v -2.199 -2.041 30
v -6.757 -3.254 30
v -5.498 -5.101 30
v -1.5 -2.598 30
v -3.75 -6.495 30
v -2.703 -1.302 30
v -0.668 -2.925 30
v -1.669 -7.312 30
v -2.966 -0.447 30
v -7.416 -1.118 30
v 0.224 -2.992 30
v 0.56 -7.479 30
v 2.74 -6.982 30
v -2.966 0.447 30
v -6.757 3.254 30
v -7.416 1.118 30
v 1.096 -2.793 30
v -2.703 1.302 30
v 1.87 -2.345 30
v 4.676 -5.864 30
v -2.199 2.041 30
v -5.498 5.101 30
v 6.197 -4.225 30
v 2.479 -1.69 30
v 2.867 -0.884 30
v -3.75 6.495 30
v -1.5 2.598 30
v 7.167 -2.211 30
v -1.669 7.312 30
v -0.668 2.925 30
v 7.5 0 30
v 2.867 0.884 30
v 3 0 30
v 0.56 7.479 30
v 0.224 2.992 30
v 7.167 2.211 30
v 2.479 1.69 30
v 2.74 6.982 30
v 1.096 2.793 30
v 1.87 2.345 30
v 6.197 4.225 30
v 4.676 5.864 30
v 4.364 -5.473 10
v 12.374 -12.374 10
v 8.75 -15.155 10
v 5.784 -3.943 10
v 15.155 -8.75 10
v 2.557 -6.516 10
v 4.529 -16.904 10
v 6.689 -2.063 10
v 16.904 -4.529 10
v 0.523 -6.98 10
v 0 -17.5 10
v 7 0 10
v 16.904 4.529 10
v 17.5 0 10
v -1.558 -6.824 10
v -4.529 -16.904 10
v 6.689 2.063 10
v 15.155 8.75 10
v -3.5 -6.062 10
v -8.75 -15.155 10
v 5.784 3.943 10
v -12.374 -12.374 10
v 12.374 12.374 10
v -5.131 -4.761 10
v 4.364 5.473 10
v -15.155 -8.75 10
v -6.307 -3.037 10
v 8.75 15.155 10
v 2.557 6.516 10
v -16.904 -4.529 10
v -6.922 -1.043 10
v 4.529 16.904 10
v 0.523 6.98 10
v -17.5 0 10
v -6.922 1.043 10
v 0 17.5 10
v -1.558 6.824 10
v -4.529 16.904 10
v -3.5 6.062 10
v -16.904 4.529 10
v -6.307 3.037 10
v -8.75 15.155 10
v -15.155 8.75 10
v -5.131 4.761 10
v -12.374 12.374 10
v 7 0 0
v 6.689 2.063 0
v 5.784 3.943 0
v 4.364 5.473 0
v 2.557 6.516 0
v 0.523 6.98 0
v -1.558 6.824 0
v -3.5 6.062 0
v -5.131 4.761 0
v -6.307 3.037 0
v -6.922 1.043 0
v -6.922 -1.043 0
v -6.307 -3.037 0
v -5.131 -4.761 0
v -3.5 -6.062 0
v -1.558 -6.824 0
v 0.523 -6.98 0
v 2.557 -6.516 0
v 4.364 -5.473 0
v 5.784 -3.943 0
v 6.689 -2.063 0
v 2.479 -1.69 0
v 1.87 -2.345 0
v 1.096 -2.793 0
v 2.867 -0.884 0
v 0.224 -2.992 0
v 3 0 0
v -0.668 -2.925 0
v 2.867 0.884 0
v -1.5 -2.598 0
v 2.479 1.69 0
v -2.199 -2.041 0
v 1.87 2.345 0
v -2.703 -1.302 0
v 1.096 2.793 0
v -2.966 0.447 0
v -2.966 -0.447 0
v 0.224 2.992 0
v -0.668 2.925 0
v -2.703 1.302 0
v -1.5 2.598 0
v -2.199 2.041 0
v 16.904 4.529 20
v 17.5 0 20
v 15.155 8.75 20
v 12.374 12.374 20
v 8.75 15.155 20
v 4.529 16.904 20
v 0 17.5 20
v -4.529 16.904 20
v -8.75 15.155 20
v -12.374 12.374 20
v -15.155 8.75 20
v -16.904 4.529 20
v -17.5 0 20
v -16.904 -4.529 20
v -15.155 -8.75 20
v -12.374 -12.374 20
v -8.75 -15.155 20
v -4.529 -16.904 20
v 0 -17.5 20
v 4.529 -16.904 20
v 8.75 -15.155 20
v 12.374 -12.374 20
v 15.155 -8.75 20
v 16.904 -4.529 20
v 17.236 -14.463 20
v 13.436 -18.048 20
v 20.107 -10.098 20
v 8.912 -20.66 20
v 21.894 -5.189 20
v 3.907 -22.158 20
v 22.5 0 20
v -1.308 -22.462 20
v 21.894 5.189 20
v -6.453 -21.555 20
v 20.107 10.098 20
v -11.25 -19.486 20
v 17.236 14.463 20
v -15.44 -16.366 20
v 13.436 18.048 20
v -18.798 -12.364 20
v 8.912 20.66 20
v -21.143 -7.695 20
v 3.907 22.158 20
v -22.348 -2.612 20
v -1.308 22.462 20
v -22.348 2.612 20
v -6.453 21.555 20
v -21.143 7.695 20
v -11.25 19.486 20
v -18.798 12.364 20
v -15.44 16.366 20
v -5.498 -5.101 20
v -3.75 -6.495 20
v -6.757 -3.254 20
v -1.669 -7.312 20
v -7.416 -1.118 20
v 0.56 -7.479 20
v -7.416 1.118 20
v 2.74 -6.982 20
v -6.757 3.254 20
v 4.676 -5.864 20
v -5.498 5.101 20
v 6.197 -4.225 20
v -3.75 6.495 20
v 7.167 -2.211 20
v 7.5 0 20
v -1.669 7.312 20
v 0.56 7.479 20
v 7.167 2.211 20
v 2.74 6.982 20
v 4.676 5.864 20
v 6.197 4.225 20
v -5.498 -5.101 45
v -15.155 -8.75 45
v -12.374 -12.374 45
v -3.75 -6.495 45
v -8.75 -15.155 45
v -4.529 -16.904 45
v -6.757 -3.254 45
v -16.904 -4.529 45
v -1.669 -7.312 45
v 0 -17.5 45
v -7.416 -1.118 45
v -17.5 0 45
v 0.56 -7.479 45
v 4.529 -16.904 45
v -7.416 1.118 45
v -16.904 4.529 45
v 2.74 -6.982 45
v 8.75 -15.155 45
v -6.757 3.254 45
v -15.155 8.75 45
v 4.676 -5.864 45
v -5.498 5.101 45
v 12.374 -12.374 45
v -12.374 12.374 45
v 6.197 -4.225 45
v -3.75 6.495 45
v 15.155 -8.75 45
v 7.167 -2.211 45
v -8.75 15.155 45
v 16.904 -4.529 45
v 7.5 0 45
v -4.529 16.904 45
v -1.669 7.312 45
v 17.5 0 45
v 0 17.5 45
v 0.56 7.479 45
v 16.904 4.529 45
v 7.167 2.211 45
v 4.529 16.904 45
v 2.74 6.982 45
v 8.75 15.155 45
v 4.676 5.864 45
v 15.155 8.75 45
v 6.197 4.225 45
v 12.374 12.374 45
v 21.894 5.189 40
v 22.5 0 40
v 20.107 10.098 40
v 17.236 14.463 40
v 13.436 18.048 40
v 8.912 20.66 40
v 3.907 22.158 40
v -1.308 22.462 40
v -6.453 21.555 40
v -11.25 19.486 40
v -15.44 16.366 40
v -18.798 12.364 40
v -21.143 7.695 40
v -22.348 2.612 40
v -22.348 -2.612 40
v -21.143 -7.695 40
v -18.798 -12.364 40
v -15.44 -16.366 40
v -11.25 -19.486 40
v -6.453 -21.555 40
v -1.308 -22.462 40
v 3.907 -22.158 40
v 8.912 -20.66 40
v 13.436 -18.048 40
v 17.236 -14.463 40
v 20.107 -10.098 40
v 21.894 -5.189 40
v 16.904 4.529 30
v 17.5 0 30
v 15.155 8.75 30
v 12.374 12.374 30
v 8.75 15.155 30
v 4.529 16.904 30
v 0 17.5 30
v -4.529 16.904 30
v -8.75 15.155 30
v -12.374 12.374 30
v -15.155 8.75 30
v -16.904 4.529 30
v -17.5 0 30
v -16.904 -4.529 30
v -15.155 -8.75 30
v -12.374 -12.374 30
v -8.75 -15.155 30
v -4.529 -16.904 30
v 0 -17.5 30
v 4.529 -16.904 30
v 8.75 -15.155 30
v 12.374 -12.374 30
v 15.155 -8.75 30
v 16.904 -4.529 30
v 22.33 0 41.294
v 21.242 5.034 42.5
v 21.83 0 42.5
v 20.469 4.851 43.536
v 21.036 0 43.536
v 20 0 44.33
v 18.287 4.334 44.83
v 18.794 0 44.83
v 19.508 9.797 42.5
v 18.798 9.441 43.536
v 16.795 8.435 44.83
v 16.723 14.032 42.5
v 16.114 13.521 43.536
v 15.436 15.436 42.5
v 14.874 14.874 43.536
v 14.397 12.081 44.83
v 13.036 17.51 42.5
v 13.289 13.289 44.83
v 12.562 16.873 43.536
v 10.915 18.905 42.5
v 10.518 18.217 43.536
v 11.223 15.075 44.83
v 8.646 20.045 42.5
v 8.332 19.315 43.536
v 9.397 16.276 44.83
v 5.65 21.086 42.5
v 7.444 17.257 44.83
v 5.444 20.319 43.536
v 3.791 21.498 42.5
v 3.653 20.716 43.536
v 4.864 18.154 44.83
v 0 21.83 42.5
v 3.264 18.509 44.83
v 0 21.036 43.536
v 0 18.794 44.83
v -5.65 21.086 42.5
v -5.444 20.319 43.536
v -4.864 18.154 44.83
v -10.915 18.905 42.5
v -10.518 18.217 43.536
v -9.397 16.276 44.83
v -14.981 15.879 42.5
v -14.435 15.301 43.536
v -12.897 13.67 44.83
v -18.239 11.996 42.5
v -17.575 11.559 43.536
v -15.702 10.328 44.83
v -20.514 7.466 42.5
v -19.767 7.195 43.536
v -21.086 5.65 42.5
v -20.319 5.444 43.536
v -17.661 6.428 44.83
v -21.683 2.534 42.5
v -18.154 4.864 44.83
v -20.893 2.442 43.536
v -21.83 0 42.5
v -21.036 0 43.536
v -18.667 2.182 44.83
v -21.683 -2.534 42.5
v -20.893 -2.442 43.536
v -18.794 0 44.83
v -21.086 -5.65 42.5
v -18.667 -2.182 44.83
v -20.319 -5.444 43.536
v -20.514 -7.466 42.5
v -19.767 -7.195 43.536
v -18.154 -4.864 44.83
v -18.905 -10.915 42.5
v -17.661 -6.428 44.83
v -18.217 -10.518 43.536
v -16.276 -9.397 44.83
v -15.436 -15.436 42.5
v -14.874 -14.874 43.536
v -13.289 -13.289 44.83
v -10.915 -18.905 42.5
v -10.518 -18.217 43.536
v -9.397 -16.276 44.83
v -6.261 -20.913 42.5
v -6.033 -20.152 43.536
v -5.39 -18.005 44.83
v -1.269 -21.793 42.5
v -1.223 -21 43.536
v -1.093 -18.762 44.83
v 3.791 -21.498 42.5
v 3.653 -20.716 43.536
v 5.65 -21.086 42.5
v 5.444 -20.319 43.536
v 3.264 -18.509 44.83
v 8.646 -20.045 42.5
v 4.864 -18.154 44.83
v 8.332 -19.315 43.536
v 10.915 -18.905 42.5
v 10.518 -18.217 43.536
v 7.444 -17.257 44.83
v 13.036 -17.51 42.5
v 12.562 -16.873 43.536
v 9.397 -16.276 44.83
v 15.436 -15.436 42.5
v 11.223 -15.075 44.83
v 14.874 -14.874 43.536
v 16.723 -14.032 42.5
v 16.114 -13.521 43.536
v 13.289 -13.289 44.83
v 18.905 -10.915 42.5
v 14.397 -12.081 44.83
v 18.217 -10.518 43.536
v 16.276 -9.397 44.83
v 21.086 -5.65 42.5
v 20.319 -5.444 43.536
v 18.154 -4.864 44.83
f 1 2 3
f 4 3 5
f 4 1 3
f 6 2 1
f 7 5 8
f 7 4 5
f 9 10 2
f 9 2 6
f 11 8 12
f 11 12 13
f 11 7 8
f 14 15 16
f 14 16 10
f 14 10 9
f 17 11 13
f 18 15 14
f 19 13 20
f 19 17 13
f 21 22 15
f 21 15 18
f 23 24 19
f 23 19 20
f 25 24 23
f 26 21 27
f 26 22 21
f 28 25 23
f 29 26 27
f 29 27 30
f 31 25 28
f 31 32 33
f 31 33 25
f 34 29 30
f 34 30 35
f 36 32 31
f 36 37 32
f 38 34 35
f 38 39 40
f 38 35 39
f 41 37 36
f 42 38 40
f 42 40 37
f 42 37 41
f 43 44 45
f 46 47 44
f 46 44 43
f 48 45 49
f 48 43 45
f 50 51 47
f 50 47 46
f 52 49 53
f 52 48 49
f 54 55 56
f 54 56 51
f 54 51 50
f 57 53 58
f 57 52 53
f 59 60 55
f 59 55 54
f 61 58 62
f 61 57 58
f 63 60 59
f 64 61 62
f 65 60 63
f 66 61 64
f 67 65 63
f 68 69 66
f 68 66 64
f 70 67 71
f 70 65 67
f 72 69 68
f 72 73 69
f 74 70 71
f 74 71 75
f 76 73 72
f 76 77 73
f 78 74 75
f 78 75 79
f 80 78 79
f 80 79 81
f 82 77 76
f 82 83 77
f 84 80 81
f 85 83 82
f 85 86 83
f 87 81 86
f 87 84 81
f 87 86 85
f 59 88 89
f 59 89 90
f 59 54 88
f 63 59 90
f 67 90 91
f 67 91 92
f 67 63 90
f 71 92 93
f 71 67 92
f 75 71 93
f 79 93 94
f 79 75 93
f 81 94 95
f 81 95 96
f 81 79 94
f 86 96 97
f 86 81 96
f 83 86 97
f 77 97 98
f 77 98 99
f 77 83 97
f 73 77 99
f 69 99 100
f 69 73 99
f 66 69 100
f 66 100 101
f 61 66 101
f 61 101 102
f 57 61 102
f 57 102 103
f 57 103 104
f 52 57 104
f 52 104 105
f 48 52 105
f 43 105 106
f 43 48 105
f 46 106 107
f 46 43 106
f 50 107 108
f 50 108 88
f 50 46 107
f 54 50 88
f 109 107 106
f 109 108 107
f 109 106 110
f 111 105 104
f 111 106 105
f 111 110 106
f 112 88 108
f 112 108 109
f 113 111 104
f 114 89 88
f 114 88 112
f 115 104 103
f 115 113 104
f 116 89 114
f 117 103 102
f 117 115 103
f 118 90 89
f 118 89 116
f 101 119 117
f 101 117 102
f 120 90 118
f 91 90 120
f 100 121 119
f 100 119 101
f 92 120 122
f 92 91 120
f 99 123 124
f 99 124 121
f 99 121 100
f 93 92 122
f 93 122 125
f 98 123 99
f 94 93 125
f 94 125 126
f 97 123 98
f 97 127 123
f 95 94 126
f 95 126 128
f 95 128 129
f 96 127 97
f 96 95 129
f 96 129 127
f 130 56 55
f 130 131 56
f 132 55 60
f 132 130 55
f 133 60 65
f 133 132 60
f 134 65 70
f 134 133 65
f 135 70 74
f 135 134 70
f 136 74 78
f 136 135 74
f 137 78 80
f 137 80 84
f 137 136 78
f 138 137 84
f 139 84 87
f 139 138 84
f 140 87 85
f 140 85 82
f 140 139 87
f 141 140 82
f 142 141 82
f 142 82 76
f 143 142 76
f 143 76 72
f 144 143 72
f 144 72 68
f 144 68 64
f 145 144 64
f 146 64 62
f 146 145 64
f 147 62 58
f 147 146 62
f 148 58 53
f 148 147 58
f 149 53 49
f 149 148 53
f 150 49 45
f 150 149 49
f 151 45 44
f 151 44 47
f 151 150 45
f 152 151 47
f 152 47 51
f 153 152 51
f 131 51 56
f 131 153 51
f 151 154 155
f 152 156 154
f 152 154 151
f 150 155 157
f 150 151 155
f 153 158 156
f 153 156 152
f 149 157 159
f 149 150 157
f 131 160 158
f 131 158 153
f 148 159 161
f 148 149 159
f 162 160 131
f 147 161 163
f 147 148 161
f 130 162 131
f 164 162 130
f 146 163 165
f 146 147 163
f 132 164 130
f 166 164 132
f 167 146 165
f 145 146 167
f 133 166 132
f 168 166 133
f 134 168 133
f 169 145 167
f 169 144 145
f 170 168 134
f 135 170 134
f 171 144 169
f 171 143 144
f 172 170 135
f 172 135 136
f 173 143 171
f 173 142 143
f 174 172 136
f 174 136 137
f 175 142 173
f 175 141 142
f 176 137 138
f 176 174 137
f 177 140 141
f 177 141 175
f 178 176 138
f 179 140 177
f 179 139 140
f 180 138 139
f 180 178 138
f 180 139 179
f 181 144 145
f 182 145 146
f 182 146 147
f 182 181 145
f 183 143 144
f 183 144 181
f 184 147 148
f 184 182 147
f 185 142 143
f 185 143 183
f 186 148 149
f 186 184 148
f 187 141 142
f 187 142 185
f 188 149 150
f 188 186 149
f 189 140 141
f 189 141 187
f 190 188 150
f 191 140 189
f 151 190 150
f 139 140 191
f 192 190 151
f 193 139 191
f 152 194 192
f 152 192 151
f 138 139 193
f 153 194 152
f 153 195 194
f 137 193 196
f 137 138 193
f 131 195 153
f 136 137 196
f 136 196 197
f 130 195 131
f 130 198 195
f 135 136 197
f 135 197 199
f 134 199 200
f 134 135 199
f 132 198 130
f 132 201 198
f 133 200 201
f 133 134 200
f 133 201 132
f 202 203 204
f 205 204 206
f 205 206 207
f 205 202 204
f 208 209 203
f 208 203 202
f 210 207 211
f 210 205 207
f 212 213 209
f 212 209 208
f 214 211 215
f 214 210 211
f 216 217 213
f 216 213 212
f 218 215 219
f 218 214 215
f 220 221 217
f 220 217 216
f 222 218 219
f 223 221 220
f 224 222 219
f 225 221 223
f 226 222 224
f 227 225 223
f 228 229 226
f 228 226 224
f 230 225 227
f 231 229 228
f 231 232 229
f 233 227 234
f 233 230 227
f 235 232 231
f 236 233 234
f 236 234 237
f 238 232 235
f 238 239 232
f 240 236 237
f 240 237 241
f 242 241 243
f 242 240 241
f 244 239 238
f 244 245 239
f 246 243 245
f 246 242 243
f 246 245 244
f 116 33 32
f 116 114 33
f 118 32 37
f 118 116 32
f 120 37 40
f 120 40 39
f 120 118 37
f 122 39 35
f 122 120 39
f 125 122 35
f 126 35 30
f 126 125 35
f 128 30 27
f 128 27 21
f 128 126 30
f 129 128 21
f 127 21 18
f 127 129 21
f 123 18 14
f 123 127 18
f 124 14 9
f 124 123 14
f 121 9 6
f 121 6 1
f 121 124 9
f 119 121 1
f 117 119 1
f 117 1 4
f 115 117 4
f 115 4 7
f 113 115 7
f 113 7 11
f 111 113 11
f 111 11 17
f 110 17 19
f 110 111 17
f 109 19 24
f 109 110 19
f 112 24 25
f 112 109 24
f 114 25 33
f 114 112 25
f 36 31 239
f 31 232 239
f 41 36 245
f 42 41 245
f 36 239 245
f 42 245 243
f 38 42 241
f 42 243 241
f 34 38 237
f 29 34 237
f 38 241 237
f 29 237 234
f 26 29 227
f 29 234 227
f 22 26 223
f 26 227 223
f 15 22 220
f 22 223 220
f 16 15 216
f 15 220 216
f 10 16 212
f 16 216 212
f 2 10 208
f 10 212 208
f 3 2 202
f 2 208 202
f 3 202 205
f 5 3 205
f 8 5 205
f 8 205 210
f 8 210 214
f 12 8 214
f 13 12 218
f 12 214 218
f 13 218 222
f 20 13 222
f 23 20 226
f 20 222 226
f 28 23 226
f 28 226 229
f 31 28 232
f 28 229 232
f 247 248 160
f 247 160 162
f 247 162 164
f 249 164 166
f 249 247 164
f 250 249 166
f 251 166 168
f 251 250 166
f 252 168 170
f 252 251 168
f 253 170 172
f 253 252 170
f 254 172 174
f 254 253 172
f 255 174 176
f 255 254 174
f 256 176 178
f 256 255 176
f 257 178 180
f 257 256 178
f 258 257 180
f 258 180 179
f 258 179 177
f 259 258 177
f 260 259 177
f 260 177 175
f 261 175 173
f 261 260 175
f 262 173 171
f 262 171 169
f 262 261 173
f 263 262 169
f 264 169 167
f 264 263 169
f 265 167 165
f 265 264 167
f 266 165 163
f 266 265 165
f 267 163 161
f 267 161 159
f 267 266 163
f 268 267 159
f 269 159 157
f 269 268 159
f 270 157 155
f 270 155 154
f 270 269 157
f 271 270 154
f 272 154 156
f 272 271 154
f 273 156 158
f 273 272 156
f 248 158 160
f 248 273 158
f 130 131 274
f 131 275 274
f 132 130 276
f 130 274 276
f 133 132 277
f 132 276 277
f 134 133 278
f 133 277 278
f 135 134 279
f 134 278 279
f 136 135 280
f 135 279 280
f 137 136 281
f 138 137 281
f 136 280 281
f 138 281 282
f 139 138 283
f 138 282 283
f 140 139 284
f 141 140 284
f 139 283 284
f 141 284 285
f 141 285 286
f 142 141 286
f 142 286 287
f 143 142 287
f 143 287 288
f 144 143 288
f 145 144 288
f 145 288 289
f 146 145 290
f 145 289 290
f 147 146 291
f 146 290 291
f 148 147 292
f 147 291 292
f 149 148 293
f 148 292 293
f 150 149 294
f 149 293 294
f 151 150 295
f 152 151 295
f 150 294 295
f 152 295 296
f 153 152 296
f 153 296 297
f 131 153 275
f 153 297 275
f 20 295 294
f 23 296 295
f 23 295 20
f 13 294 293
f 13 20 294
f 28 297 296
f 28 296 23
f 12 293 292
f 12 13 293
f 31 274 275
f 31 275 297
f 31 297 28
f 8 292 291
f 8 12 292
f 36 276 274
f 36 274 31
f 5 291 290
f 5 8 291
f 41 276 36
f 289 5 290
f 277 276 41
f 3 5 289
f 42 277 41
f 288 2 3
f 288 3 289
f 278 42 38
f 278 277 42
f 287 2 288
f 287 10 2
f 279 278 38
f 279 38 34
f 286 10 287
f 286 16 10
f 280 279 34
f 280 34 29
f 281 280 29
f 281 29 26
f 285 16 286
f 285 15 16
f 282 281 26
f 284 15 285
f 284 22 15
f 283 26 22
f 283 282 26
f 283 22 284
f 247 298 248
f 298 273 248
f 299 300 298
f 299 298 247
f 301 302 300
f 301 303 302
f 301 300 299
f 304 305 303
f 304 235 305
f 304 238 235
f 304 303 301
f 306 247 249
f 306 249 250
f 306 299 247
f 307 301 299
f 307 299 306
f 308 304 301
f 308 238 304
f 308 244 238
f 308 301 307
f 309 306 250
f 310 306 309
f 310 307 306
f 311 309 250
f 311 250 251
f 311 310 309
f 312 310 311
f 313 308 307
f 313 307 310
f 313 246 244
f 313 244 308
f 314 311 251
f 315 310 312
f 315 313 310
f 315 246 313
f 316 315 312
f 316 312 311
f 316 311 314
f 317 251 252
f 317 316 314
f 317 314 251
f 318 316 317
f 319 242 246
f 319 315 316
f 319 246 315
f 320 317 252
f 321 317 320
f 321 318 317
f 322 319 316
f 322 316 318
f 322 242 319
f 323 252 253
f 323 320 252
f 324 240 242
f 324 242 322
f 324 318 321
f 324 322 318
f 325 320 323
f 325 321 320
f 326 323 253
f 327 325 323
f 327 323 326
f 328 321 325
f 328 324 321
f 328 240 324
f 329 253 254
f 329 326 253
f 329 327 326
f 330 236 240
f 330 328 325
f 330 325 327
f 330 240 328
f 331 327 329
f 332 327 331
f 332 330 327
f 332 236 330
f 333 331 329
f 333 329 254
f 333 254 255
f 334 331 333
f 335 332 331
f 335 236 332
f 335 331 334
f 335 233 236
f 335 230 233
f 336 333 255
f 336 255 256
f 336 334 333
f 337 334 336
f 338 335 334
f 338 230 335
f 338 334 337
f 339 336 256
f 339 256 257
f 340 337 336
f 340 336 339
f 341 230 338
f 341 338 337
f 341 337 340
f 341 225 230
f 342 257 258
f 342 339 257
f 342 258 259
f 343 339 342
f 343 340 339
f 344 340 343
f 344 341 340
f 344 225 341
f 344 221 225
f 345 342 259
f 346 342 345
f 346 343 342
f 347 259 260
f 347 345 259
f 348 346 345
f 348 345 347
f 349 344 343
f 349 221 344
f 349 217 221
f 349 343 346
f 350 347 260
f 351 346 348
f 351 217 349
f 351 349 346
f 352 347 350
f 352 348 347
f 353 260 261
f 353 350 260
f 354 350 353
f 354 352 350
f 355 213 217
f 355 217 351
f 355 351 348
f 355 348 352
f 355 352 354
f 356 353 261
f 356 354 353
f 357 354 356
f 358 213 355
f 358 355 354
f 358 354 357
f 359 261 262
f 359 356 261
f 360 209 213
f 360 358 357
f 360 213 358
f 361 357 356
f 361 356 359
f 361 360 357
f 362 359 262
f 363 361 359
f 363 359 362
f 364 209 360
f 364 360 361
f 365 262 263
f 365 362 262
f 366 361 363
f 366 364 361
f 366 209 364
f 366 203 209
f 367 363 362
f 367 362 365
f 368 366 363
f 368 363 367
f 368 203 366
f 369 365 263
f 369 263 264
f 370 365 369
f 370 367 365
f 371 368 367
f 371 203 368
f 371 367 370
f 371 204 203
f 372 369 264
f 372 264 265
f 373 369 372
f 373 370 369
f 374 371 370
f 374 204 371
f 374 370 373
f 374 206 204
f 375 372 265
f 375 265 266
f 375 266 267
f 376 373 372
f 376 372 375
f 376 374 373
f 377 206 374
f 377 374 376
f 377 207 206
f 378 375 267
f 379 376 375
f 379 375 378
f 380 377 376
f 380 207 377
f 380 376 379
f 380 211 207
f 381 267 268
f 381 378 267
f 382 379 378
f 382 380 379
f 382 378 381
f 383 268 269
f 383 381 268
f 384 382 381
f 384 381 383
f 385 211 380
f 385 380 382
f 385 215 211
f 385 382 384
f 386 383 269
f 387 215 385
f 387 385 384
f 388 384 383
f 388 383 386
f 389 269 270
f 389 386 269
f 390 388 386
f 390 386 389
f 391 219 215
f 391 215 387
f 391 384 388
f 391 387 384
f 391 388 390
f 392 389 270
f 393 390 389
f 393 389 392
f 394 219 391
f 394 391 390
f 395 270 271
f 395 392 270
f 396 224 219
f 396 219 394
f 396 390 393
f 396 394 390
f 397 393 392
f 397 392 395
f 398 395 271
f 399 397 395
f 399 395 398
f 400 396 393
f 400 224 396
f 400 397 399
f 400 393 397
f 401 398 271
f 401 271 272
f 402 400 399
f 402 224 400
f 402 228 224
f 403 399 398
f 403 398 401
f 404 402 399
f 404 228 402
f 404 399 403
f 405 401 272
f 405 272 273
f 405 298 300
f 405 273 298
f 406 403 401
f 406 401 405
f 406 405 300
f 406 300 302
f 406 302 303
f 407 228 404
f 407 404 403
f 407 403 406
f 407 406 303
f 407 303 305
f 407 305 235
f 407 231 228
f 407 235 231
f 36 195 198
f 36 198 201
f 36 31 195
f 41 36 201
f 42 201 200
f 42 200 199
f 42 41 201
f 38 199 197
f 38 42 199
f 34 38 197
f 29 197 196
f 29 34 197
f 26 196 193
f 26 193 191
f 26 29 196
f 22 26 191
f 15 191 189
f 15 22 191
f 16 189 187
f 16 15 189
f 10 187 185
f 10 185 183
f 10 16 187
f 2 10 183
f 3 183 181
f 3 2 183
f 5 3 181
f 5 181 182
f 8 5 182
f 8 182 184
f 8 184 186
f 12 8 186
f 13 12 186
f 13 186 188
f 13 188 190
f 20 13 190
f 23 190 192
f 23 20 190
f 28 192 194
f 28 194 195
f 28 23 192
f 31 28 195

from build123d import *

# Parameters (mm, degrees)
F0_W   = 10
F0_H   = 15
F0_W_2 = 5
F0_H_2 = 10
F0_W_3 = 4
F0_W_4 = 0.5
F2_R   = 5


with BuildPart() as f1:
    # F0 (on Front) → F1 (revolve)
    with BuildSketch(Plane.XZ):
        with Locations((12.5, 37.5)):
            Rectangle(F0_W, F0_H)
        with Locations((20, 37.5)):
            Rectangle(F0_W_2, F0_H)
        with Locations((20, 25)):
            Rectangle(F0_W_2, F0_H_2)
    revolve(axis=Axis((0, 0, 22.5), (0, 0, 1)))

    # F2
    f2_edges = [f1.edges().sort_by_distance(p)[0] for p in [
        (-22.5, 0, 45),
    ]]
    fillet(f2_edges, radius=F2_R)


with BuildPart() as f1b:
    # F0 (on Front) → F1, piece 2 (revolve)
    with BuildSketch(Plane.XZ):
        with Locations((12.5, 15)):
            Rectangle(F0_W, F0_H_2)
        with Locations((5, 5)):
            Rectangle(F0_W_3, F0_H_2)
        with Locations((7.25, 15)):
            Rectangle(F0_W_4, F0_H_2)
        with Locations((7.25, 25)):
            Rectangle(F0_W_4, F0_H_2)
        with Locations((5, 25)):
            Rectangle(F0_W_3, F0_H_2)
        with Locations((5, 15)):
            Rectangle(F0_W_3, F0_H_2)
    revolve(axis=Axis((0, 0, 22.5), (0, 0, 1)))


solid = Compound([f1.part, f1b.part])
